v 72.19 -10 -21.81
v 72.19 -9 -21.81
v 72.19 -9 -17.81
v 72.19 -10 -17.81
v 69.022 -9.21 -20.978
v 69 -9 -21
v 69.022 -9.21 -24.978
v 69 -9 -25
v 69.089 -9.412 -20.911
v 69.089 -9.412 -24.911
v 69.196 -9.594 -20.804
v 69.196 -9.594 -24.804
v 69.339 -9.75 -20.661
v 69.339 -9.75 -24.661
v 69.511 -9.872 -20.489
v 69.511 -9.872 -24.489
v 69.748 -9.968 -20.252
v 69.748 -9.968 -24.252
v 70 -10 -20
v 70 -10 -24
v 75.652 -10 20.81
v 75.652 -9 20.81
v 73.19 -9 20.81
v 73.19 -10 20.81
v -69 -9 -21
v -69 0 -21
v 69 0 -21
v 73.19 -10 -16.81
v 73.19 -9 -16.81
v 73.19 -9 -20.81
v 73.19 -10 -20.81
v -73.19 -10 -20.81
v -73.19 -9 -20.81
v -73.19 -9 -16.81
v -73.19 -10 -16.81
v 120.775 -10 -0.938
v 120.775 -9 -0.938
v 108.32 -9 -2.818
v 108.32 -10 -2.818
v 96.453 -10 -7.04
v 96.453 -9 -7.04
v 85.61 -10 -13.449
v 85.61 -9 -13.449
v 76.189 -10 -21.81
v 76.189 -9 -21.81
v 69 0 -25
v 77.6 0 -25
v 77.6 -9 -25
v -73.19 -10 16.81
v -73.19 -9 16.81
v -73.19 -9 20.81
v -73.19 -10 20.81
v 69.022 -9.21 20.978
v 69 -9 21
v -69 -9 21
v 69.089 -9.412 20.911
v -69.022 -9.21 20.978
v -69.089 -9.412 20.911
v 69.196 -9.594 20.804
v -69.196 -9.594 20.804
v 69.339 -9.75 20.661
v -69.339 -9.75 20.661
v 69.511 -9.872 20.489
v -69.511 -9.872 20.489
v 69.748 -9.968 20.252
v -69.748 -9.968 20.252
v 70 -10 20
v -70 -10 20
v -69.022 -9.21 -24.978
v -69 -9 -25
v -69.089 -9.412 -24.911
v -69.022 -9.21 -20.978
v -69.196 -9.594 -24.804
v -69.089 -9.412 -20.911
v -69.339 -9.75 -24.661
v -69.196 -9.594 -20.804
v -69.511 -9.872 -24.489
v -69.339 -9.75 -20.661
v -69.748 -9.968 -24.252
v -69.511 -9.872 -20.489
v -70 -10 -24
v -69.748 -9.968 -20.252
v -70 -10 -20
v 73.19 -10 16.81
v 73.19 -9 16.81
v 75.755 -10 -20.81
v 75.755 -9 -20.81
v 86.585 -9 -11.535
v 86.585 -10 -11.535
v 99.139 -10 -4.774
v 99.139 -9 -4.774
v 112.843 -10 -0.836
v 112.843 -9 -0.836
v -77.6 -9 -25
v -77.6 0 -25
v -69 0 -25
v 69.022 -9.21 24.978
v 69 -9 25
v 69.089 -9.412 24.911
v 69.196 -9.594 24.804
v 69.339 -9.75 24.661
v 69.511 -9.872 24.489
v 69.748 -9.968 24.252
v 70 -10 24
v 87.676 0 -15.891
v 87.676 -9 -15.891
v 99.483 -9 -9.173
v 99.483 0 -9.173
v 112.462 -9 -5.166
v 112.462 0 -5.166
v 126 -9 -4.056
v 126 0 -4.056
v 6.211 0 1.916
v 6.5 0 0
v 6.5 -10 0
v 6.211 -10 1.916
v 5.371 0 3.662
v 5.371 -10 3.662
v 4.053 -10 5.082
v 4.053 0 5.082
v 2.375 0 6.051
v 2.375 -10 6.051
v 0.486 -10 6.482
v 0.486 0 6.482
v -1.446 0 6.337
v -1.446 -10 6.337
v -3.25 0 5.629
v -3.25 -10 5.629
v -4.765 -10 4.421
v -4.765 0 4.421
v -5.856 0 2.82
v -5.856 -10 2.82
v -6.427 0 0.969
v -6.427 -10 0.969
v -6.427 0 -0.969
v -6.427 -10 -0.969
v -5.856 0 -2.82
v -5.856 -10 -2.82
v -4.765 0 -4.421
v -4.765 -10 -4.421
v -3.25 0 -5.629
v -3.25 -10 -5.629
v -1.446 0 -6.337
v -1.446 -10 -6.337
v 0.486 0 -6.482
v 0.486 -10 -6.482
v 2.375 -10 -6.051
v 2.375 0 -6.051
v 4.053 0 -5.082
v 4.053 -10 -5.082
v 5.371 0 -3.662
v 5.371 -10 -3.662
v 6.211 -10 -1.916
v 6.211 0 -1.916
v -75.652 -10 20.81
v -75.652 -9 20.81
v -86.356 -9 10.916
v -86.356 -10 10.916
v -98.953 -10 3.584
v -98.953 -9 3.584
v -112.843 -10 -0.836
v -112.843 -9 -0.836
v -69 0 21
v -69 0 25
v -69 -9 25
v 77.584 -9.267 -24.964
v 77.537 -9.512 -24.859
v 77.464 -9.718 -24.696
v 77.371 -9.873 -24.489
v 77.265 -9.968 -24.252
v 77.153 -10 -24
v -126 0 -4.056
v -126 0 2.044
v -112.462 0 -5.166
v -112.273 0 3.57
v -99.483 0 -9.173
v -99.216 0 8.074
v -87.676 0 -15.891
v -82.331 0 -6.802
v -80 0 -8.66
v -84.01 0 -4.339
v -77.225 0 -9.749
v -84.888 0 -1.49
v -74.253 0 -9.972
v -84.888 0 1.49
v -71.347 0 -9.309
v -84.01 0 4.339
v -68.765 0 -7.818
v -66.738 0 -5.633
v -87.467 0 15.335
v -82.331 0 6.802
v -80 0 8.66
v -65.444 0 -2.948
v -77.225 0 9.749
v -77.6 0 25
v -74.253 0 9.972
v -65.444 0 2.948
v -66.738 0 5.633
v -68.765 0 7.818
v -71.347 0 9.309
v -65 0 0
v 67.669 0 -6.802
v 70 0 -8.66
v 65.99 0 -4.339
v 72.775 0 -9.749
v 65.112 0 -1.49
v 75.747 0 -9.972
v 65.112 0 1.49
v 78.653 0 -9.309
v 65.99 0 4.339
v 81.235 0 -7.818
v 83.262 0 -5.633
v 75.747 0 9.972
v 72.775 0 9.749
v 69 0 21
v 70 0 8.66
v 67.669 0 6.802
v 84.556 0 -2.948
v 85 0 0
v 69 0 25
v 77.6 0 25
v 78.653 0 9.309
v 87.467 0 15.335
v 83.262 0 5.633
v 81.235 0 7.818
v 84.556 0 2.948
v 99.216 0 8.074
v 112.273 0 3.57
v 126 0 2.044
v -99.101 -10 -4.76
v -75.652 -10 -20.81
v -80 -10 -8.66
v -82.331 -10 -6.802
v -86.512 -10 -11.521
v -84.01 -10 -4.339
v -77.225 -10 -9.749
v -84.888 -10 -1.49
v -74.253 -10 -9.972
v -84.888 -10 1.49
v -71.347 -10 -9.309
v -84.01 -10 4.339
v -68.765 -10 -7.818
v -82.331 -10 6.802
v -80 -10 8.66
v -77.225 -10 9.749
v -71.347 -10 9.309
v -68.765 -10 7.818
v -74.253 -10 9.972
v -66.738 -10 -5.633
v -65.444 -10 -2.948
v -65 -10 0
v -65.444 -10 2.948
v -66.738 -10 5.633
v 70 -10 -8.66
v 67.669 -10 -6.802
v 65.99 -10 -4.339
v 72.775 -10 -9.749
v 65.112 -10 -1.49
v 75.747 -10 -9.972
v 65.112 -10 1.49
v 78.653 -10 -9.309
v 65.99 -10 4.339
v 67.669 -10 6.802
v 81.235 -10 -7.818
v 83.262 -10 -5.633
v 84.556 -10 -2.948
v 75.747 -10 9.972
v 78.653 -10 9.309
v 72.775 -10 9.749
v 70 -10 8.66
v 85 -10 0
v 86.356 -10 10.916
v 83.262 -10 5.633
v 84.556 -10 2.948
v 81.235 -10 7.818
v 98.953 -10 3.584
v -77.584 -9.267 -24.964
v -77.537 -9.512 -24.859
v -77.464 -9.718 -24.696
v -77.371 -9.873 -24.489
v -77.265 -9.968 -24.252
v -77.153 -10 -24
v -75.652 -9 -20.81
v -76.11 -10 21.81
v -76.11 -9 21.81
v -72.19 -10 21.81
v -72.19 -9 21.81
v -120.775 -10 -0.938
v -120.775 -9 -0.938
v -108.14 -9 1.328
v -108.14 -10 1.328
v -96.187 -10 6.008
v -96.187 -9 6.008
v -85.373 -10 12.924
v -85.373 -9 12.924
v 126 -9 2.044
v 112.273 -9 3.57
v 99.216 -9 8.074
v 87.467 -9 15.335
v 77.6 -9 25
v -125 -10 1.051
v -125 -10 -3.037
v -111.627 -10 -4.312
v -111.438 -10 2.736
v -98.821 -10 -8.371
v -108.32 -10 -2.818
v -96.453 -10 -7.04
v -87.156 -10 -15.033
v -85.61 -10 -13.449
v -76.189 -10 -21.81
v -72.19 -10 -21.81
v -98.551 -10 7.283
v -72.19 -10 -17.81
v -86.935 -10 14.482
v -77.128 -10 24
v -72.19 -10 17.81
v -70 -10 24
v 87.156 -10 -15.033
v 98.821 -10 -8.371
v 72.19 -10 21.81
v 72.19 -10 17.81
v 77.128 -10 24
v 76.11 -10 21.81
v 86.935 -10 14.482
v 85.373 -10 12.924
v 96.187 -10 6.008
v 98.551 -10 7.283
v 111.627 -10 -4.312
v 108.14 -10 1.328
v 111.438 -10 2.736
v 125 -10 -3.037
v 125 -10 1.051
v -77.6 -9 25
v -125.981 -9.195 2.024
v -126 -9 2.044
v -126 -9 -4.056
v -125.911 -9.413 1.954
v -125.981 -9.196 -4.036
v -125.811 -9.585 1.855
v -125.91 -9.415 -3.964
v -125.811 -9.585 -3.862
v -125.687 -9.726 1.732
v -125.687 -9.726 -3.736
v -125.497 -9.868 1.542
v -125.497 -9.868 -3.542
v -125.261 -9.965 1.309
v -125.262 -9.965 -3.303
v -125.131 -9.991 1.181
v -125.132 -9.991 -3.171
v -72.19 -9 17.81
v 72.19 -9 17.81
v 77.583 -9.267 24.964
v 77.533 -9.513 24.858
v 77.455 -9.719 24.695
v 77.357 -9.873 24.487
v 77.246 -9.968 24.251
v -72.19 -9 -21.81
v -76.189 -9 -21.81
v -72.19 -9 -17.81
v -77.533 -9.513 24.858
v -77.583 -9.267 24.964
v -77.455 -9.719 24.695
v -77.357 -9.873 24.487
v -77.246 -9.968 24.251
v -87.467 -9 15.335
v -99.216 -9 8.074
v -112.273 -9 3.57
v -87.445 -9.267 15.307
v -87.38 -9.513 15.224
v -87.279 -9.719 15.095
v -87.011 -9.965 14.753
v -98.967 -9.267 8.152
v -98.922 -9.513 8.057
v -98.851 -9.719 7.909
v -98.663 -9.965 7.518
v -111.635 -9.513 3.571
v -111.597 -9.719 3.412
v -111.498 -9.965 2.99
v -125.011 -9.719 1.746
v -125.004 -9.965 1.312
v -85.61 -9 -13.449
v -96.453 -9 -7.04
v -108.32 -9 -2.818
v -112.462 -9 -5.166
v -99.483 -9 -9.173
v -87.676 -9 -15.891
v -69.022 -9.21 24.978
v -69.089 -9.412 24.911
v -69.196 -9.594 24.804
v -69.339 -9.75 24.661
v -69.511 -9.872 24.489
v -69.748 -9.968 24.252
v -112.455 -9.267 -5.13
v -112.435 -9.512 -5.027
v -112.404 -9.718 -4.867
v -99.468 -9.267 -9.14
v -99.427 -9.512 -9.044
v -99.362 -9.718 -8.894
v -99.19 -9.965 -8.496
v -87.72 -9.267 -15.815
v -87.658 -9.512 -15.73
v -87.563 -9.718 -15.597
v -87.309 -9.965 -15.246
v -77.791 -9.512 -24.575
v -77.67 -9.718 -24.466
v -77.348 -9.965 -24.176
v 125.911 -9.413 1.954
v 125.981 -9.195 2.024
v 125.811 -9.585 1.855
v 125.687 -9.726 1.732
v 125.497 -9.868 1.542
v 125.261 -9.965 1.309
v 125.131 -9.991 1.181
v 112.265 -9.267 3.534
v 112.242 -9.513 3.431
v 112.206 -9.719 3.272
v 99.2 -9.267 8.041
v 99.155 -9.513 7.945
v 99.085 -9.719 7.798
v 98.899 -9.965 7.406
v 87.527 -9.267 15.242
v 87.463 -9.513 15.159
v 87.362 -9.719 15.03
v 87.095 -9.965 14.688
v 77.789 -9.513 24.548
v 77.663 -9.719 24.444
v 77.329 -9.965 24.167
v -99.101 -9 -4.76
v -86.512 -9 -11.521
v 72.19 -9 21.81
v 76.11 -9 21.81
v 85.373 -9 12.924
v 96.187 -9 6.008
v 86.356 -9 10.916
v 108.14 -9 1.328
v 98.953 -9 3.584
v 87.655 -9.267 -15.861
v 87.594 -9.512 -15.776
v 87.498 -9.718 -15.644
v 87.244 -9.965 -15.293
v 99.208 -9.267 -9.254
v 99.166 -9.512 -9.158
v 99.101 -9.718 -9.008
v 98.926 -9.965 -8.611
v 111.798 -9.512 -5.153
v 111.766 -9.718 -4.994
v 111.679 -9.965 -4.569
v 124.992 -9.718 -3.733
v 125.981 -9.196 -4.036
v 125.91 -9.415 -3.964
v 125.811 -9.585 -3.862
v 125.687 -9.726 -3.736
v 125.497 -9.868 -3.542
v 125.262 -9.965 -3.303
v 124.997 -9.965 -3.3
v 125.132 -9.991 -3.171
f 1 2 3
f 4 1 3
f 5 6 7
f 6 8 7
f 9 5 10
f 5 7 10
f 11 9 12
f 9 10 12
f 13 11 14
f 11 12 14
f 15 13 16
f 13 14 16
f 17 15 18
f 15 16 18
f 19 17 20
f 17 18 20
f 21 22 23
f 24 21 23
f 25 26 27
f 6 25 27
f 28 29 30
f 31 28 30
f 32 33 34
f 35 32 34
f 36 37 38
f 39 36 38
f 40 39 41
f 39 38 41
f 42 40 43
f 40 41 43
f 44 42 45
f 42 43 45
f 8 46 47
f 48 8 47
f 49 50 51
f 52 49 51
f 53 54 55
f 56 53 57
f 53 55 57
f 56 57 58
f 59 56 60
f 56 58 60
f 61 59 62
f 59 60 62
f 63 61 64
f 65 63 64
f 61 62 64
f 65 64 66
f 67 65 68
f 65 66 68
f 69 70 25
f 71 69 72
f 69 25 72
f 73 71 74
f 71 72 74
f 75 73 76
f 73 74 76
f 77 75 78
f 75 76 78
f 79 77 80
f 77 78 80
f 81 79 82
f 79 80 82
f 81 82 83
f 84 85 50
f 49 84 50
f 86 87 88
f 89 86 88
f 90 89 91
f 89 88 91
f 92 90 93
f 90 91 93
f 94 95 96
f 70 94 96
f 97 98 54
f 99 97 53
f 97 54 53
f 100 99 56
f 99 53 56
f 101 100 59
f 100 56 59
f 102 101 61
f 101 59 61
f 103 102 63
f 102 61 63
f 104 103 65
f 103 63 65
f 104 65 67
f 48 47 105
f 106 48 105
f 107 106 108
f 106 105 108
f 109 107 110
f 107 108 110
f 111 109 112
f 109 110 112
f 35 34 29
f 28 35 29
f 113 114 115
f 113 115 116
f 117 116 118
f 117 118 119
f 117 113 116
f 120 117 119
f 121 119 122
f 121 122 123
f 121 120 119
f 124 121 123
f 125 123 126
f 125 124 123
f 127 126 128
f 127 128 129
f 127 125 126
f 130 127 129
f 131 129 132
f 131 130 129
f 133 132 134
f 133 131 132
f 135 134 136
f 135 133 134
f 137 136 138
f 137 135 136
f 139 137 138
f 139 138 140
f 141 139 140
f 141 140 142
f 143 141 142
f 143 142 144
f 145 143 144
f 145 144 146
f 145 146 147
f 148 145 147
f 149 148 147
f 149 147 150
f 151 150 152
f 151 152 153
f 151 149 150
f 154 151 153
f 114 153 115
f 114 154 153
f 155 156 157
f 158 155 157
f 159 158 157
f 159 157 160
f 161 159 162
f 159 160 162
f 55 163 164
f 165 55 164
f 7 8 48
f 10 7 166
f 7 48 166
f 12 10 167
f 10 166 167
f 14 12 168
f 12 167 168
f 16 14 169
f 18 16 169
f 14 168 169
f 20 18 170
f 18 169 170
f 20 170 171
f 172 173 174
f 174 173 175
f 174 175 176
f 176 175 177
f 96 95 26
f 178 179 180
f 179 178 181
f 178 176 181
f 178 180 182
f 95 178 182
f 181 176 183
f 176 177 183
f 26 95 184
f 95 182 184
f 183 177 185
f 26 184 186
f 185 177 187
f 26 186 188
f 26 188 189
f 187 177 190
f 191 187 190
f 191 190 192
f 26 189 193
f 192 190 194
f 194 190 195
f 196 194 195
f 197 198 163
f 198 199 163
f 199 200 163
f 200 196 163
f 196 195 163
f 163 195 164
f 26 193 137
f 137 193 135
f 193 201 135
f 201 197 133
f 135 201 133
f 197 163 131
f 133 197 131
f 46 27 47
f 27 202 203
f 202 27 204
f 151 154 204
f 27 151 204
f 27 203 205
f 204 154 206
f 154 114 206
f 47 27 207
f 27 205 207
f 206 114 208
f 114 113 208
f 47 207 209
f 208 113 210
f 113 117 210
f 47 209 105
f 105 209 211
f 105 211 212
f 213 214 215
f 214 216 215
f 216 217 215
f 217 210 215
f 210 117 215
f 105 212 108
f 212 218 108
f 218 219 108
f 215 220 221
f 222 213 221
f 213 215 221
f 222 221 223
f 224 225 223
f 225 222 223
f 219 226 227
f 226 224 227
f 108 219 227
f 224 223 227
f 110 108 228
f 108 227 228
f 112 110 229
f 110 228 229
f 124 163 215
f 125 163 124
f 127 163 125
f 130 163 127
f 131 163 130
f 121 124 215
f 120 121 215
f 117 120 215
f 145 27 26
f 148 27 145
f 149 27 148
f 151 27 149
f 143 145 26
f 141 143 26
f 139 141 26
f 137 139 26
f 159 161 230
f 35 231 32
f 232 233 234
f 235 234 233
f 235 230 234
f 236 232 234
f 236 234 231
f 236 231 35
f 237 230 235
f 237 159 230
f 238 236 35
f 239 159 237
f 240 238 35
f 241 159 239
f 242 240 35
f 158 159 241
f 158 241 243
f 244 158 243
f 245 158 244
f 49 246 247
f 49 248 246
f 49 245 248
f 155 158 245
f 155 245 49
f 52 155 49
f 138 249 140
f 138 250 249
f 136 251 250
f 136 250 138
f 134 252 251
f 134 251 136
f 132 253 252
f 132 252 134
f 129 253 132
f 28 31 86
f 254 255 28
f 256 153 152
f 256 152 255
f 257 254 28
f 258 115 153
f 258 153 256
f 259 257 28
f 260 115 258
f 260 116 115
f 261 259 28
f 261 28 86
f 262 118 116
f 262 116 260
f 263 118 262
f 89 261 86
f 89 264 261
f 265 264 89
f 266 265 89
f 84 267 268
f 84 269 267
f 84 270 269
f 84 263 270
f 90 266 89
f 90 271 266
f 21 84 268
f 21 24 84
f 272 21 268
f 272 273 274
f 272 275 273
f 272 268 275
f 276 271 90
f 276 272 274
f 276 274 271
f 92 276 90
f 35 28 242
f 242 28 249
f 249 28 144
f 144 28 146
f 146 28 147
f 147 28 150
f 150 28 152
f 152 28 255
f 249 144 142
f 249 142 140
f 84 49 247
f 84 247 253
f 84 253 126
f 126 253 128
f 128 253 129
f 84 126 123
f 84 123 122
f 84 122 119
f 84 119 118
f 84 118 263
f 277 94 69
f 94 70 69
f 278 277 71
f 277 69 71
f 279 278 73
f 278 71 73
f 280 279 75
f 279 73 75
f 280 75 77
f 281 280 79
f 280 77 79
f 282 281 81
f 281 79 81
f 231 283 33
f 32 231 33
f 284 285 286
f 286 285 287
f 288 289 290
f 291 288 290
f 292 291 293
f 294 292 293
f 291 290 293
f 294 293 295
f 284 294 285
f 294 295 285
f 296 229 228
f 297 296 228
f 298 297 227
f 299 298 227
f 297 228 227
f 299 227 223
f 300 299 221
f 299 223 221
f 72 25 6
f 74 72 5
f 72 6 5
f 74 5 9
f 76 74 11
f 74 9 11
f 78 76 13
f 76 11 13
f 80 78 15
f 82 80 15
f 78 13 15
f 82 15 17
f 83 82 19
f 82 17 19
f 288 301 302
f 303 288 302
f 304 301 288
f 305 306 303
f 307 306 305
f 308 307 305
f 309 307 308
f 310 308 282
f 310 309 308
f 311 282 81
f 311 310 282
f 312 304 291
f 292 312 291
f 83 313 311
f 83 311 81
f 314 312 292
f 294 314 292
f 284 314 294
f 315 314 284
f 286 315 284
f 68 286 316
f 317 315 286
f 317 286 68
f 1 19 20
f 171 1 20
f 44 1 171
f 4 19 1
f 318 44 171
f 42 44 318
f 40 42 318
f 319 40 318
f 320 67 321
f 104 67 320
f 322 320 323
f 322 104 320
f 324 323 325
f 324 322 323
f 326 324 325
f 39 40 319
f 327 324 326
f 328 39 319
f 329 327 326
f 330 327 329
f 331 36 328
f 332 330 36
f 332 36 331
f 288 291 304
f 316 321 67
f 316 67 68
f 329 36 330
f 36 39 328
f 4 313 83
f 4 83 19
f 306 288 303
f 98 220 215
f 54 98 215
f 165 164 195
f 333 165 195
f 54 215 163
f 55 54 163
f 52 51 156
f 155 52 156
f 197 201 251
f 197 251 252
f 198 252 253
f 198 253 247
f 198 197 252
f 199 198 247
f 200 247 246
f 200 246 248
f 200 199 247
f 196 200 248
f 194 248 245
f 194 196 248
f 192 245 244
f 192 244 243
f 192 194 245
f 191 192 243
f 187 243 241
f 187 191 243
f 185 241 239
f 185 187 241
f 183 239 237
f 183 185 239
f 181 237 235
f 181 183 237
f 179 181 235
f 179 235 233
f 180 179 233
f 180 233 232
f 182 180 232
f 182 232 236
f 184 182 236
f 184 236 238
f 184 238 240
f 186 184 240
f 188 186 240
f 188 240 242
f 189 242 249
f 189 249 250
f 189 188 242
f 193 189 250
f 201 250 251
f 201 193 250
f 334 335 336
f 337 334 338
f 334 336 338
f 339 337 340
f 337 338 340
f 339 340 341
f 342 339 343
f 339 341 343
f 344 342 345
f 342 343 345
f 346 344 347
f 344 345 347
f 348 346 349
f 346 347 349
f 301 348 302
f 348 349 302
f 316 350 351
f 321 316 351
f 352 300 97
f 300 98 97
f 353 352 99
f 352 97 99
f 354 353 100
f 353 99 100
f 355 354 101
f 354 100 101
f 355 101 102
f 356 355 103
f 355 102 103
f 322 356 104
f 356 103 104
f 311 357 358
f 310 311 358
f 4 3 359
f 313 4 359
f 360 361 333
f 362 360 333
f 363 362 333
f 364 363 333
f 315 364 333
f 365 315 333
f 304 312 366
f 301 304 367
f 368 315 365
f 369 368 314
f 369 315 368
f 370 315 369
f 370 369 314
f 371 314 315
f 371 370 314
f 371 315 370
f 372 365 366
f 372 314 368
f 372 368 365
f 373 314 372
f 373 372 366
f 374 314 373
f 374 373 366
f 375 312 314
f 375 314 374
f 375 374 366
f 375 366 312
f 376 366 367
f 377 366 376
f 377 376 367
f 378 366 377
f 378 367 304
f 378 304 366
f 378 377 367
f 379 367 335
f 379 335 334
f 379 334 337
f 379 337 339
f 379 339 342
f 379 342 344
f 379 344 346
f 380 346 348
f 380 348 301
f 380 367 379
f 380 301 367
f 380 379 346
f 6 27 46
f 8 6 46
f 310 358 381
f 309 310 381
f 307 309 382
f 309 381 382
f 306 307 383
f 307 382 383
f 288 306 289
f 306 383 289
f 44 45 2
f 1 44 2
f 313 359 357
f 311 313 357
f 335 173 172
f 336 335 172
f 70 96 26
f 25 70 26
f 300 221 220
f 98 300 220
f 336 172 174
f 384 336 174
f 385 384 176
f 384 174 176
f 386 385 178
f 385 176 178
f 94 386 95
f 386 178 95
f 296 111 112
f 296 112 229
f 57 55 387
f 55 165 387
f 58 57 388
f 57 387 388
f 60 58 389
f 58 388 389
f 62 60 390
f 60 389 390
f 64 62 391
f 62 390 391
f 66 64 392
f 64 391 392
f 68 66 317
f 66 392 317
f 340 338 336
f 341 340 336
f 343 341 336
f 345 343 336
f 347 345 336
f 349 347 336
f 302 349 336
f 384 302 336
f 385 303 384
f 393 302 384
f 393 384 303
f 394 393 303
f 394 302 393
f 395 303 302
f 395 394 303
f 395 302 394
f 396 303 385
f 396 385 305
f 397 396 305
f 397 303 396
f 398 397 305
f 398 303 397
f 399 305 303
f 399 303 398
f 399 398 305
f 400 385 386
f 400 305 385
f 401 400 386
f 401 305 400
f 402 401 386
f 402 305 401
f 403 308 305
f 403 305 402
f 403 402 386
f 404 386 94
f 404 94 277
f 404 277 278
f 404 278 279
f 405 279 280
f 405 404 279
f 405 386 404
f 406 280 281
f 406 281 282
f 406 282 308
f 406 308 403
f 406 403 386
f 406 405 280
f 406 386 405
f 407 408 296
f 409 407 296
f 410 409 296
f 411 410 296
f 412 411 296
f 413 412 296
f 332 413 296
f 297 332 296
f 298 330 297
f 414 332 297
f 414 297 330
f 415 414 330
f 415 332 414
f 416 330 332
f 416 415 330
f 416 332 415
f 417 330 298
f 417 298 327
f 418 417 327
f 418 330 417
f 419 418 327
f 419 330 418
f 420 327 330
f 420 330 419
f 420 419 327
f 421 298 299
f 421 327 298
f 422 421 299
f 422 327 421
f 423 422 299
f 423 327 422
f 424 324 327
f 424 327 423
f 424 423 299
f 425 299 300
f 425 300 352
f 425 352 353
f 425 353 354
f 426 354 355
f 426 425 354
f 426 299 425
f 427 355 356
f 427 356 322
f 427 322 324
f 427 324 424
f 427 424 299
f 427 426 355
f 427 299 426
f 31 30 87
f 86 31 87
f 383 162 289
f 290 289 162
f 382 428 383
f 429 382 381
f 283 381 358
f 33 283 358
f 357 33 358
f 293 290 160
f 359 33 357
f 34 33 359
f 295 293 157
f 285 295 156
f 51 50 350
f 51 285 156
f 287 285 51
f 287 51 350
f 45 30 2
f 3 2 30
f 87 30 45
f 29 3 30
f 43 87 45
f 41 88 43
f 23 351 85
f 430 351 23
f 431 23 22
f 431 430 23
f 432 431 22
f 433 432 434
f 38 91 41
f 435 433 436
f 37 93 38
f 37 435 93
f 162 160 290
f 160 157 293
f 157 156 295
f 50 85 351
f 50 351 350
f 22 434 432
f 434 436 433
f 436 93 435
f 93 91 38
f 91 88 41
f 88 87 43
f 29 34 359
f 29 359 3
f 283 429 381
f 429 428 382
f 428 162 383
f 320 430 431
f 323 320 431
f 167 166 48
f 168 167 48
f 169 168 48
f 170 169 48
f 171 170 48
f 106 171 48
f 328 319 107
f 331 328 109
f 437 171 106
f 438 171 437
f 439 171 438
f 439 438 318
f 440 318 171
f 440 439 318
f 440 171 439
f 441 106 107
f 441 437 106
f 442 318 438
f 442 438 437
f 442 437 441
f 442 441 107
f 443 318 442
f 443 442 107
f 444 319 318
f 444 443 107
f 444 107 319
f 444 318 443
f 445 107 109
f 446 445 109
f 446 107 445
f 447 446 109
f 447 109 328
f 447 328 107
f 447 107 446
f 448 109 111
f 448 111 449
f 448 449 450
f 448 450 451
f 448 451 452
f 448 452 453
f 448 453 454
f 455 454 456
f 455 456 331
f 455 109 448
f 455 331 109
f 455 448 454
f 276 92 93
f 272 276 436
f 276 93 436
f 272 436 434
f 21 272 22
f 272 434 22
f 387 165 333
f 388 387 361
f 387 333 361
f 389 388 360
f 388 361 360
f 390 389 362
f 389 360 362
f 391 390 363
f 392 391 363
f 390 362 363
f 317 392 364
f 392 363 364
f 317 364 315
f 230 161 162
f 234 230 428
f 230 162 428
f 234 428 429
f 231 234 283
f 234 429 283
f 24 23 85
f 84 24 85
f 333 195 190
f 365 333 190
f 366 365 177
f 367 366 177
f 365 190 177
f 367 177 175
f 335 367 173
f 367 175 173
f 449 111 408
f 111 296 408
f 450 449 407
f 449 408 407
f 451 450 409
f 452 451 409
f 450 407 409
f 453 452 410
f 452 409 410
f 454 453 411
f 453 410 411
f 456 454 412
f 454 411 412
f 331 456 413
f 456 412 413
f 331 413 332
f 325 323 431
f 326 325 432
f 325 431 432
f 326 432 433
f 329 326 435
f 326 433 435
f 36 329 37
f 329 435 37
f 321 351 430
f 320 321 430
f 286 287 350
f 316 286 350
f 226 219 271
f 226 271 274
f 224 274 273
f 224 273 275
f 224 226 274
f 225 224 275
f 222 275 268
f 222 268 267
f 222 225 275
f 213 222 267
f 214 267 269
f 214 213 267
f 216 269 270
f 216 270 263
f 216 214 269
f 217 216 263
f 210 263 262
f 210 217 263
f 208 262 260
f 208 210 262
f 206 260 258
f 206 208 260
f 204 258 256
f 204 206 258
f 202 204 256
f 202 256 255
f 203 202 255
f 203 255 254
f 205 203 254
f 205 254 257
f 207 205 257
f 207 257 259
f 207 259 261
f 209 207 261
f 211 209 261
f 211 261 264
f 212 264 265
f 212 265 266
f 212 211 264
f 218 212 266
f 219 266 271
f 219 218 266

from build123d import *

# Parameters (mm, degrees)
F0_R     = 10
F0_R_2   = 6.5
F1_DEPTH = 10
F2_DEPTH = 9
F3_R     = 1


with BuildPart() as f1:
    # F0 (on Front) → F1 (new body)
    with BuildSketch(Plane.XZ):
        with BuildLine():
            Line((69, -25), (77.6, -25))
            ThreePointArc((77.6, -25), (99.482843, -9.173343), (126, -4.05648))
            Line((126, -4.05648), (126, 2.04352))
            ThreePointArc((126, 2.04352), (99.215863, 8.073528), (77.6, 25))
            Line((77.6, 25), (69, 25))
            Line((69, 25), (69, 21))
            Line((69, 21), (-69, 21))
            Line((-69, 21), (-69, 25))
            Line((-69, 25), (-77.6, 25))
            ThreePointArc((-77.6, 25), (-99.215863, 8.073528), (-126, 2.04352))
            Line((-126, 2.04352), (-126, -4.05648))
            ThreePointArc((-126, -4.05648), (-99.482843, -9.173343), (-77.6, -25))
            Line((-77.6, -25), (-69, -25))
            Line((-69, -25), (-69, -21))
            Line((-69, -21), (69, -21))
            Line((69, -21), (69, -25))
        make_face()
        with BuildLine():
            Line((-76.109897, 21.81), (-72.19, 21.81))
            Line((-72.19, 21.81), (-72.19, 17.81))
            Line((-72.19, 17.81), (72.19, 17.81))
            Line((72.19, 17.81), (72.19, 21.81))
            Line((72.19, 21.81), (76.109897, 21.81))
            ThreePointArc((76.109897, 21.81), (96.187204, 6.008289), (120.774538, -0.938314))
            ThreePointArc((120.774538, -0.938314), (96.452782, -7.039668), (76.189226, -21.81))
            Line((76.189226, -21.81), (72.19, -21.81))
            Line((72.19, -21.81), (72.19, -17.81))
            Line((72.19, -17.81), (-72.19, -17.81))
            Line((-72.19, -17.81), (-72.19, -21.81))
            Line((-72.19, -21.81), (-76.189226, -21.81))
            ThreePointArc((-76.189226, -21.81), (-96.452782, -7.039668), (-120.774538, -0.938314))
            ThreePointArc((-120.774538, -0.938314), (-96.187204, 6.008289), (-76.109897, 21.81))
        make_face(mode=Mode.SUBTRACT)
        with BuildLine():
            Line((-73.19, 16.81), (-73.19, 20.81))
            Line((-73.19, 20.81), (-75.651859, 20.81))
            ThreePointArc((-75.651859, 20.81), (-92.453393, 6.905154), (-112.842512, -0.835655))
            ThreePointArc((-112.842512, -0.835655), (-92.625004, -7.802454), (-75.651859, -20.81))
            Line((-75.651859, -20.81), (-73.19, -20.81))
            Line((-73.19, -20.81), (-73.19, -16.81))
            Line((-73.19, -16.81), (73.19, -16.81))
            Line((73.19, -16.81), (73.19, -20.81))
            Line((73.19, -20.81), (75.755417, -20.81))
            ThreePointArc((75.755417, -20.81), (92.680477, -7.817723), (112.842512, -0.835655))
            ThreePointArc((112.842512, -0.835655), (92.453393, 6.905154), (75.651859, 20.81))
            Line((75.651859, 20.81), (73.19, 20.81))
            Line((73.19, 20.81), (73.19, 16.81))
            Line((73.19, 16.81), (-73.19, 16.81))
        make_face()
        with Locations((-75, 0)):
            Circle(F0_R, mode=Mode.SUBTRACT)
        Circle(F0_R_2, mode=Mode.SUBTRACT)
        with Locations((75, 0)):
            Circle(F0_R, mode=Mode.SUBTRACT)
    extrude(amount=F1_DEPTH)

    # F0 (on Front) → F2 (join)
    with BuildSketch(Plane.XZ):
        with BuildLine():
            Line((-72.19, 17.81), (-72.19, 21.81))
            Line((-72.19, 21.81), (-76.109897, 21.81))
            ThreePointArc((-76.109897, 21.81), (-96.187204, 6.008289), (-120.774538, -0.938314))
            ThreePointArc((-120.774538, -0.938314), (-96.452782, -7.039668), (-76.189226, -21.81))
            Line((-76.189226, -21.81), (-72.19, -21.81))
            Line((-72.19, -21.81), (-72.19, -17.81))
            Line((-72.19, -17.81), (72.19, -17.81))
            Line((72.19, -17.81), (72.19, -21.81))
            Line((72.19, -21.81), (76.189226, -21.81))
            ThreePointArc((76.189226, -21.81), (96.452782, -7.039668), (120.774538, -0.938314))
            ThreePointArc((120.774538, -0.938314), (96.187204, 6.008289), (76.109897, 21.81))
            Line((76.109897, 21.81), (72.19, 21.81))
            Line((72.19, 21.81), (72.19, 17.81))
            Line((72.19, 17.81), (-72.19, 17.81))
        make_face()
        with BuildLine():
            Line((-75.651859, 20.81), (-73.19, 20.81))
            Line((-73.19, 20.81), (-73.19, 16.81))
            Line((-73.19, 16.81), (73.19, 16.81))
            Line((73.19, 16.81), (73.19, 20.81))
            Line((73.19, 20.81), (75.651859, 20.81))
            ThreePointArc((75.651859, 20.81), (92.453393, 6.905154), (112.842512, -0.835655))
            ThreePointArc((112.842512, -0.835655), (92.680477, -7.817723), (75.755417, -20.81))
            Line((75.755417, -20.81), (73.19, -20.81))
            Line((73.19, -20.81), (73.19, -16.81))
            Line((73.19, -16.81), (-73.19, -16.81))
            Line((-73.19, -16.81), (-73.19, -20.81))
            Line((-73.19, -20.81), (-75.651859, -20.81))
            ThreePointArc((-75.651859, -20.81), (-92.625004, -7.802454), (-112.842512, -0.835655))
            ThreePointArc((-112.842512, -0.835655), (-92.453393, 6.905154), (-75.651859, 20.81))
        make_face(mode=Mode.SUBTRACT)
    extrude(amount=F2_DEPTH)

    # F3
    f3_edges = [f1.edges().sort_by_distance(p)[0] for p in [
        (-99.215863, -10, 8.073528),
        (-126, -10, -1.00648),
        (-99.482843, -10, -9.173343),
        (-73.3, -10, -25),
        (-69, -10, -23),
        (0, -10, -21),
        (-73.3, -10, 25),
        (-69, -10, 23),
        (0, -10, 21),
        (69, -10, -23),
        (73.3, -10, -25),
        (99.482843, -10, -9.173343),
        (126, -10, -1.00648),
        (99.215863, -10, 8.073528),
        (73.3, -10, 25),
        (69, -10, 23),
    ]]
    fillet(f3_edges, radius=F3_R)


solid = f1.part
